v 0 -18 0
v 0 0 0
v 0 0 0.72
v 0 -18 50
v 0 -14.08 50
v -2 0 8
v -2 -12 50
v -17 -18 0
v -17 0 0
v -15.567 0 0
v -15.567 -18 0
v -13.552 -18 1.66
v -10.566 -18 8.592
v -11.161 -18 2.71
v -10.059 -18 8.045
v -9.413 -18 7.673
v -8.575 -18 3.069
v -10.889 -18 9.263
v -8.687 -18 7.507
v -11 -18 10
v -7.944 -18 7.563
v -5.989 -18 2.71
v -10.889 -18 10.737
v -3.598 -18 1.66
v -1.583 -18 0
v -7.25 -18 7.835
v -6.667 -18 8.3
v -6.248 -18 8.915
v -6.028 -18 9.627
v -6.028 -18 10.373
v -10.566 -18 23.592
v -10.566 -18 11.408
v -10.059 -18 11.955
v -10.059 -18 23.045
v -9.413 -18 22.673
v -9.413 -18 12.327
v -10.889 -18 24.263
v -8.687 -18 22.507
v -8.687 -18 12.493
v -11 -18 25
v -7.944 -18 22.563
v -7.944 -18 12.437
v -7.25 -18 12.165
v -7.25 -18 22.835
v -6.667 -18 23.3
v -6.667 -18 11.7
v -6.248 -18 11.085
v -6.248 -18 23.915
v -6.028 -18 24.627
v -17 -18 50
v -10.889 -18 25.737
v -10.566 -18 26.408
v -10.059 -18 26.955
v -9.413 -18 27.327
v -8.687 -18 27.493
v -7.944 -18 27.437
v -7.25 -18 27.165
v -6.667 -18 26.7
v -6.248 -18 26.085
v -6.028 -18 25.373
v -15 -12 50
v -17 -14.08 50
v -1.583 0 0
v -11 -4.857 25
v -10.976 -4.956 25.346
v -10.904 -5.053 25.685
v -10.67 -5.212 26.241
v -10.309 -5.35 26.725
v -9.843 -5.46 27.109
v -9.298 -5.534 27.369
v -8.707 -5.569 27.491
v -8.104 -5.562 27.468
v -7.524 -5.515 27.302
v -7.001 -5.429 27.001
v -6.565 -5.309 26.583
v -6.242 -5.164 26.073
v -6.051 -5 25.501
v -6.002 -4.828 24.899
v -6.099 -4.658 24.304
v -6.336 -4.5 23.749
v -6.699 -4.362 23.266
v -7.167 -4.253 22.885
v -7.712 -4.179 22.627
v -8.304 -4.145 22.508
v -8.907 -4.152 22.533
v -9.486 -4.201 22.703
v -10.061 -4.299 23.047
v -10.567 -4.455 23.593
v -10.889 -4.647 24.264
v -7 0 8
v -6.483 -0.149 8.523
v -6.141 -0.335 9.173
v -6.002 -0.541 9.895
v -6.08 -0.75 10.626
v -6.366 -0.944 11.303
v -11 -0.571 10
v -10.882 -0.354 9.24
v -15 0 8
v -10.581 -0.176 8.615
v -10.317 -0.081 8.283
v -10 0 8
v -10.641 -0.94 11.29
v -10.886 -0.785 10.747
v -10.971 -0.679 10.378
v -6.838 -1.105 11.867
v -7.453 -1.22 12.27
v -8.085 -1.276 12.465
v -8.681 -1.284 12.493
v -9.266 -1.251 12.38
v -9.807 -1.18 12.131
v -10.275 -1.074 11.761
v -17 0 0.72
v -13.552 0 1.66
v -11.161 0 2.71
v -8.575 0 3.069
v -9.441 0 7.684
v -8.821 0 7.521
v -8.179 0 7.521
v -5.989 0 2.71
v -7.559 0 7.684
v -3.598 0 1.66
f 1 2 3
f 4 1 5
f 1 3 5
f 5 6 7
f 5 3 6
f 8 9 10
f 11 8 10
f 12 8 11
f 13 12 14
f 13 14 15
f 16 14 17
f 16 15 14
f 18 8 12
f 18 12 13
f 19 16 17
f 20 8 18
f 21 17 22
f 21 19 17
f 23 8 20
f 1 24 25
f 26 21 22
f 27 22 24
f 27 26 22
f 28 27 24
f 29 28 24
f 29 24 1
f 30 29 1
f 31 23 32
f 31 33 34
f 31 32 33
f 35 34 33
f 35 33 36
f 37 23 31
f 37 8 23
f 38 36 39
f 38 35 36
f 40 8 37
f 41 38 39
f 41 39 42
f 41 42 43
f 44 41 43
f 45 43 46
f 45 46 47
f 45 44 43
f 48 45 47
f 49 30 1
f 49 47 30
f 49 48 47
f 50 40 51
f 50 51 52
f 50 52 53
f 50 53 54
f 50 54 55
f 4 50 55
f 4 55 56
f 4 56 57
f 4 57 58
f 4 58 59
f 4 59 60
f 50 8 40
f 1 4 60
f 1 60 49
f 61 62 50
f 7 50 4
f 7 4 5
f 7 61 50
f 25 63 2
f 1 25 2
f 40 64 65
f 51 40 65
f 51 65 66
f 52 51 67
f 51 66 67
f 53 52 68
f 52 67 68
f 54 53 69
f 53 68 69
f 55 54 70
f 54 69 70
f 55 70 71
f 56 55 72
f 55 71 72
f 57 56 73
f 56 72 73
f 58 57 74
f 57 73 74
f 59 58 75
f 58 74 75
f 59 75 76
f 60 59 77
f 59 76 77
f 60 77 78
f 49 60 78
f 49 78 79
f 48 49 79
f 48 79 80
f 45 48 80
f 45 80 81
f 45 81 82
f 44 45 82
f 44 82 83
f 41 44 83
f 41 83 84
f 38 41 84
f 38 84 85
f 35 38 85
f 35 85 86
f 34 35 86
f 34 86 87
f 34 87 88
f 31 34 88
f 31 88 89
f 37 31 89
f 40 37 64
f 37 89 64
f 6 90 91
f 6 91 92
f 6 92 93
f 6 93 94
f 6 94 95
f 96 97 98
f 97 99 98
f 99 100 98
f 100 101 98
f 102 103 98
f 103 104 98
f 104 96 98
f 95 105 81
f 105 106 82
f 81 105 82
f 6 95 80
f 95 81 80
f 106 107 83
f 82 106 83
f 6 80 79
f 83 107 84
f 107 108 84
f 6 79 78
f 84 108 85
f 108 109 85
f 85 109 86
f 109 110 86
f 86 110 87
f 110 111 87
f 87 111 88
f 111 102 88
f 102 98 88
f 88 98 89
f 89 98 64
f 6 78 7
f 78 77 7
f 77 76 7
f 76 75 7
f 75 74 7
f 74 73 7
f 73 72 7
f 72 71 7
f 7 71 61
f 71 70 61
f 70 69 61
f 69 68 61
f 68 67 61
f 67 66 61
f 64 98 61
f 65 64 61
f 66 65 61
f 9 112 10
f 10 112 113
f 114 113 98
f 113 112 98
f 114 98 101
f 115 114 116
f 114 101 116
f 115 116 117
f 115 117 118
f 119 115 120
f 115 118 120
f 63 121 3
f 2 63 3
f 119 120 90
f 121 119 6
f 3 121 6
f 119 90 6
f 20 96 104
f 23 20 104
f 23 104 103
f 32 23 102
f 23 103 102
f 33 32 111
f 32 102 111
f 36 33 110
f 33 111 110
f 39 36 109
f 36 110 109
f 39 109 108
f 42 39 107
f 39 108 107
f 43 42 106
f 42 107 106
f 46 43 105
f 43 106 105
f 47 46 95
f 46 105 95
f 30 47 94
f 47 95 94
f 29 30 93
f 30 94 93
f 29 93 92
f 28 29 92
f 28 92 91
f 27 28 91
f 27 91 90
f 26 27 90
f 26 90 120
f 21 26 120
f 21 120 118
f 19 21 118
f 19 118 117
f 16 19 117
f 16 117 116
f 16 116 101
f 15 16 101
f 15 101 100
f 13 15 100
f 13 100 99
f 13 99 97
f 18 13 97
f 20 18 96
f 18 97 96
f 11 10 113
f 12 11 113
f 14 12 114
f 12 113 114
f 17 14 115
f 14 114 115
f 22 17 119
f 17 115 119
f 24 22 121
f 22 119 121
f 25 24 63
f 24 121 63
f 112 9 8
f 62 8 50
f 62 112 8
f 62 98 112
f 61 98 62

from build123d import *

# Parameters (mm, degrees)
F0_W      = 17
F0_H      = 50
F1_DEPTH  = 18
F3_D      = 5
F3_DEPTH  = 25
F3_TIP    = 1.5021515476
F5_DEPTH  = 25
F6_R      = 9.5
F7_DEPTH  = 25
F8_R      = 9.5
F8_R_2    = 1.6285775441
F9_DEPTH  = 25
F10_R     = 9.5
F11_DEPTH = 25
F12_SIZE  = 2


with BuildPart() as f1:
    # F0 (on Front) → F1 (new body)
    with BuildSketch(Plane.XZ):
        with Locations((-8.5, 25)):
            Rectangle(F0_W, F0_H)
    extrude(amount=F1_DEPTH)

    # F3
    with Locations(Plane.XZ.offset(18)):
        with Locations((-8.5, 10), (-8.5, 25)):
            Hole(F3_D / 2, depth=F3_DEPTH)
            with Locations((0, 0, -(F3_DEPTH + F3_TIP / 2))):  # 118° drill point
                Cone(0, F3_D / 2, F3_TIP, mode=Mode.SUBTRACT)

    # F4 (on face) → F5 (cut)
    with BuildSketch(Plane(origin=(-17, 0, 0), x_dir=(0, -1, 0), z_dir=(-1, 0, 0))):
        Polygon((0, 50), (0, 8), (12, 50), align=None)
    extrude(amount=-F5_DEPTH, mode=Mode.SUBTRACT)

    # F6 (on Front) → F7 (cut)
    with BuildSketch(Plane.XZ):
        with Locations((-8.5753183812, -6.7173321731)):
            Circle(F6_R)
    extrude(amount=-F7_DEPTH, mode=Mode.SUBTRACT)

    # F8 (on Front) → F9 (cut)
    with BuildSketch(Plane.XZ):
        with Locations((-8.2726162836, -6.7173321731)):
            Circle(F8_R)
        with Locations((10.9988851703, -6.7173321731)):
            Circle(F8_R_2)
    extrude(amount=-F9_DEPTH, mode=Mode.SUBTRACT)

    # F10 (on face) → F11 (cut)
    with BuildSketch(Plane(origin=(0, 0, 0), x_dir=(-1, 0, 0), z_dir=(0, 1, 0))):
        with Locations((8.5753183812, -6.4314883202)):
            Circle(F10_R)
        with BuildLine():
            Line((1.5834689844, 0), (15.5671677779, 0))
            ThreePointArc((15.5671677779, 0), (8.5753183812, 3.0685116798), (1.5834689844, 0))
        make_face()
    extrude(amount=-F11_DEPTH, mode=Mode.SUBTRACT)

    # F12
    f12_edges = [f1.edges().sort_by_distance(p)[0] for p in [
        (0, -6, 29),
        (-17, -6, 29),
    ]]
    chamfer(f12_edges, length=F12_SIZE)


solid = f1.part
